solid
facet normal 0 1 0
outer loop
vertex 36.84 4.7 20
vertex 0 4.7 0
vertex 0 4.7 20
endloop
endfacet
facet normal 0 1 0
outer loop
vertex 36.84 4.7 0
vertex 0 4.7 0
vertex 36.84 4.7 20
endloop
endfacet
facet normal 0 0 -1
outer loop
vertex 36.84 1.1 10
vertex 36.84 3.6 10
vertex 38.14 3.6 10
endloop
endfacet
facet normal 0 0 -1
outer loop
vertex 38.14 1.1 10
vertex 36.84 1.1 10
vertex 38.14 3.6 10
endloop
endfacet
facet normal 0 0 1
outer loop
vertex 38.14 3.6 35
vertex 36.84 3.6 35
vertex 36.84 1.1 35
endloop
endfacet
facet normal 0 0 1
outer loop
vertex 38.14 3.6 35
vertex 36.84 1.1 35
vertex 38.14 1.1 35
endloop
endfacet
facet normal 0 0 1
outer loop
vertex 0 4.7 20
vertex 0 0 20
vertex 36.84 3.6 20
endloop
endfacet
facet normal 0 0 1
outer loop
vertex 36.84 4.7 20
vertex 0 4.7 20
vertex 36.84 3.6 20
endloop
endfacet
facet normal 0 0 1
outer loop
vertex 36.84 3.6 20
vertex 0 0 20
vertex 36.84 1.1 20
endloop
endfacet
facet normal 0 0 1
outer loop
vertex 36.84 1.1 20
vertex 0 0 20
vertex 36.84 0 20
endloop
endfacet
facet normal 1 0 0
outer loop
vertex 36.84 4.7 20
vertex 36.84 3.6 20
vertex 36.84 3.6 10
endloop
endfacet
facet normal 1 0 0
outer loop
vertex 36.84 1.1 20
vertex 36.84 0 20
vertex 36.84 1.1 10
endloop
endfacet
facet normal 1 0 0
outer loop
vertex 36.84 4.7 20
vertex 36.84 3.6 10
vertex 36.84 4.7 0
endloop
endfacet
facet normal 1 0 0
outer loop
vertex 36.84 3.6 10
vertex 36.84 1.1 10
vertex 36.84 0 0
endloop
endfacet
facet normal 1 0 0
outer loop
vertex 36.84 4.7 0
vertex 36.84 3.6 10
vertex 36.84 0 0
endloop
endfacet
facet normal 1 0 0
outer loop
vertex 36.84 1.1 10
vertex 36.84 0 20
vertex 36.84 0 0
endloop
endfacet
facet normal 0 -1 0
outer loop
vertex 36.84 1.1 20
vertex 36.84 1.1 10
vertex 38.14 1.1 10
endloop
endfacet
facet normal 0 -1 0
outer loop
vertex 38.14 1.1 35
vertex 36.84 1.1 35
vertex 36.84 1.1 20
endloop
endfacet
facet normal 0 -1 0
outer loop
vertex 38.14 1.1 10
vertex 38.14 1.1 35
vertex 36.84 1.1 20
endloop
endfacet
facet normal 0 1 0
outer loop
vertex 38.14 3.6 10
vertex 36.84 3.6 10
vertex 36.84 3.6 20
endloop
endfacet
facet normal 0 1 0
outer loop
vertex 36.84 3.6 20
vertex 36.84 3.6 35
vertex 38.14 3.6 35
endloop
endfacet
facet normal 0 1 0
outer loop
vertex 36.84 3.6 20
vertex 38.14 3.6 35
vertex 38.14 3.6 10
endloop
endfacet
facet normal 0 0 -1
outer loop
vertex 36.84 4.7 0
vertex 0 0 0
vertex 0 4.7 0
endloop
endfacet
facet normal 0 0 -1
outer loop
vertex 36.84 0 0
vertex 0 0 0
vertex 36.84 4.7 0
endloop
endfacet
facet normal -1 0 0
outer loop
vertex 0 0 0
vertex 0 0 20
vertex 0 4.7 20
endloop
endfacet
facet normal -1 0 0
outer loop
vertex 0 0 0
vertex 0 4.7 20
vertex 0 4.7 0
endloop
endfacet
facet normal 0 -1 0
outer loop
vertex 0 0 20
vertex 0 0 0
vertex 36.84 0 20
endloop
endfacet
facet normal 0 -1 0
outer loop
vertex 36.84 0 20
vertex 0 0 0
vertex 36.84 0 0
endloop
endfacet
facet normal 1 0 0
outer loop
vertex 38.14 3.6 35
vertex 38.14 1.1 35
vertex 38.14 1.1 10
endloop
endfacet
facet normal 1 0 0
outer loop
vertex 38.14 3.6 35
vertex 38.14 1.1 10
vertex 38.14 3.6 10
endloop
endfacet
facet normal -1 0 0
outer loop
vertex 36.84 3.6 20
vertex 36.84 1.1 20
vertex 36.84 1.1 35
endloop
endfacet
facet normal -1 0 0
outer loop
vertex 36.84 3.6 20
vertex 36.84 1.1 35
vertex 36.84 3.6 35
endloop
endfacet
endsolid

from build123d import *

# Parameters (mm, degrees)
SKETCH1_W                = 36.84
SKETCH1_H                = 20
BOSS_EXTRUDE1_DEPTH      = 4.7
SKETCH2_W                = 1.3
SKETCH2_H                = 2.5
BOSS_EXTRUDE2_DEPTH      = 15
BOSS_EXTRUDE2_DEPTH_BACK = 10


with BuildPart() as part:
    # Sketch1 → Boss-Extrude1 (new body)
    with BuildSketch(Plane(origin=(0, 0, 0), x_dir=(1, 0, 0), z_dir=(0, 1, 0))):
        with Locations((18.42, -10)):
            Rectangle(SKETCH1_W, SKETCH1_H)
    extrude(amount=BOSS_EXTRUDE1_DEPTH)

    # Sketch2 → Boss-Extrude2 (add, two sides)
    with BuildSketch(Plane.XY.offset(20)) as boss_extrude2_sk:
        with Locations((37.49, 2.35)):
            Rectangle(SKETCH2_W, SKETCH2_H)
    extrude(amount=BOSS_EXTRUDE2_DEPTH)
    extrude(boss_extrude2_sk.sketch, amount=-BOSS_EXTRUDE2_DEPTH_BACK)


solid = part.part
